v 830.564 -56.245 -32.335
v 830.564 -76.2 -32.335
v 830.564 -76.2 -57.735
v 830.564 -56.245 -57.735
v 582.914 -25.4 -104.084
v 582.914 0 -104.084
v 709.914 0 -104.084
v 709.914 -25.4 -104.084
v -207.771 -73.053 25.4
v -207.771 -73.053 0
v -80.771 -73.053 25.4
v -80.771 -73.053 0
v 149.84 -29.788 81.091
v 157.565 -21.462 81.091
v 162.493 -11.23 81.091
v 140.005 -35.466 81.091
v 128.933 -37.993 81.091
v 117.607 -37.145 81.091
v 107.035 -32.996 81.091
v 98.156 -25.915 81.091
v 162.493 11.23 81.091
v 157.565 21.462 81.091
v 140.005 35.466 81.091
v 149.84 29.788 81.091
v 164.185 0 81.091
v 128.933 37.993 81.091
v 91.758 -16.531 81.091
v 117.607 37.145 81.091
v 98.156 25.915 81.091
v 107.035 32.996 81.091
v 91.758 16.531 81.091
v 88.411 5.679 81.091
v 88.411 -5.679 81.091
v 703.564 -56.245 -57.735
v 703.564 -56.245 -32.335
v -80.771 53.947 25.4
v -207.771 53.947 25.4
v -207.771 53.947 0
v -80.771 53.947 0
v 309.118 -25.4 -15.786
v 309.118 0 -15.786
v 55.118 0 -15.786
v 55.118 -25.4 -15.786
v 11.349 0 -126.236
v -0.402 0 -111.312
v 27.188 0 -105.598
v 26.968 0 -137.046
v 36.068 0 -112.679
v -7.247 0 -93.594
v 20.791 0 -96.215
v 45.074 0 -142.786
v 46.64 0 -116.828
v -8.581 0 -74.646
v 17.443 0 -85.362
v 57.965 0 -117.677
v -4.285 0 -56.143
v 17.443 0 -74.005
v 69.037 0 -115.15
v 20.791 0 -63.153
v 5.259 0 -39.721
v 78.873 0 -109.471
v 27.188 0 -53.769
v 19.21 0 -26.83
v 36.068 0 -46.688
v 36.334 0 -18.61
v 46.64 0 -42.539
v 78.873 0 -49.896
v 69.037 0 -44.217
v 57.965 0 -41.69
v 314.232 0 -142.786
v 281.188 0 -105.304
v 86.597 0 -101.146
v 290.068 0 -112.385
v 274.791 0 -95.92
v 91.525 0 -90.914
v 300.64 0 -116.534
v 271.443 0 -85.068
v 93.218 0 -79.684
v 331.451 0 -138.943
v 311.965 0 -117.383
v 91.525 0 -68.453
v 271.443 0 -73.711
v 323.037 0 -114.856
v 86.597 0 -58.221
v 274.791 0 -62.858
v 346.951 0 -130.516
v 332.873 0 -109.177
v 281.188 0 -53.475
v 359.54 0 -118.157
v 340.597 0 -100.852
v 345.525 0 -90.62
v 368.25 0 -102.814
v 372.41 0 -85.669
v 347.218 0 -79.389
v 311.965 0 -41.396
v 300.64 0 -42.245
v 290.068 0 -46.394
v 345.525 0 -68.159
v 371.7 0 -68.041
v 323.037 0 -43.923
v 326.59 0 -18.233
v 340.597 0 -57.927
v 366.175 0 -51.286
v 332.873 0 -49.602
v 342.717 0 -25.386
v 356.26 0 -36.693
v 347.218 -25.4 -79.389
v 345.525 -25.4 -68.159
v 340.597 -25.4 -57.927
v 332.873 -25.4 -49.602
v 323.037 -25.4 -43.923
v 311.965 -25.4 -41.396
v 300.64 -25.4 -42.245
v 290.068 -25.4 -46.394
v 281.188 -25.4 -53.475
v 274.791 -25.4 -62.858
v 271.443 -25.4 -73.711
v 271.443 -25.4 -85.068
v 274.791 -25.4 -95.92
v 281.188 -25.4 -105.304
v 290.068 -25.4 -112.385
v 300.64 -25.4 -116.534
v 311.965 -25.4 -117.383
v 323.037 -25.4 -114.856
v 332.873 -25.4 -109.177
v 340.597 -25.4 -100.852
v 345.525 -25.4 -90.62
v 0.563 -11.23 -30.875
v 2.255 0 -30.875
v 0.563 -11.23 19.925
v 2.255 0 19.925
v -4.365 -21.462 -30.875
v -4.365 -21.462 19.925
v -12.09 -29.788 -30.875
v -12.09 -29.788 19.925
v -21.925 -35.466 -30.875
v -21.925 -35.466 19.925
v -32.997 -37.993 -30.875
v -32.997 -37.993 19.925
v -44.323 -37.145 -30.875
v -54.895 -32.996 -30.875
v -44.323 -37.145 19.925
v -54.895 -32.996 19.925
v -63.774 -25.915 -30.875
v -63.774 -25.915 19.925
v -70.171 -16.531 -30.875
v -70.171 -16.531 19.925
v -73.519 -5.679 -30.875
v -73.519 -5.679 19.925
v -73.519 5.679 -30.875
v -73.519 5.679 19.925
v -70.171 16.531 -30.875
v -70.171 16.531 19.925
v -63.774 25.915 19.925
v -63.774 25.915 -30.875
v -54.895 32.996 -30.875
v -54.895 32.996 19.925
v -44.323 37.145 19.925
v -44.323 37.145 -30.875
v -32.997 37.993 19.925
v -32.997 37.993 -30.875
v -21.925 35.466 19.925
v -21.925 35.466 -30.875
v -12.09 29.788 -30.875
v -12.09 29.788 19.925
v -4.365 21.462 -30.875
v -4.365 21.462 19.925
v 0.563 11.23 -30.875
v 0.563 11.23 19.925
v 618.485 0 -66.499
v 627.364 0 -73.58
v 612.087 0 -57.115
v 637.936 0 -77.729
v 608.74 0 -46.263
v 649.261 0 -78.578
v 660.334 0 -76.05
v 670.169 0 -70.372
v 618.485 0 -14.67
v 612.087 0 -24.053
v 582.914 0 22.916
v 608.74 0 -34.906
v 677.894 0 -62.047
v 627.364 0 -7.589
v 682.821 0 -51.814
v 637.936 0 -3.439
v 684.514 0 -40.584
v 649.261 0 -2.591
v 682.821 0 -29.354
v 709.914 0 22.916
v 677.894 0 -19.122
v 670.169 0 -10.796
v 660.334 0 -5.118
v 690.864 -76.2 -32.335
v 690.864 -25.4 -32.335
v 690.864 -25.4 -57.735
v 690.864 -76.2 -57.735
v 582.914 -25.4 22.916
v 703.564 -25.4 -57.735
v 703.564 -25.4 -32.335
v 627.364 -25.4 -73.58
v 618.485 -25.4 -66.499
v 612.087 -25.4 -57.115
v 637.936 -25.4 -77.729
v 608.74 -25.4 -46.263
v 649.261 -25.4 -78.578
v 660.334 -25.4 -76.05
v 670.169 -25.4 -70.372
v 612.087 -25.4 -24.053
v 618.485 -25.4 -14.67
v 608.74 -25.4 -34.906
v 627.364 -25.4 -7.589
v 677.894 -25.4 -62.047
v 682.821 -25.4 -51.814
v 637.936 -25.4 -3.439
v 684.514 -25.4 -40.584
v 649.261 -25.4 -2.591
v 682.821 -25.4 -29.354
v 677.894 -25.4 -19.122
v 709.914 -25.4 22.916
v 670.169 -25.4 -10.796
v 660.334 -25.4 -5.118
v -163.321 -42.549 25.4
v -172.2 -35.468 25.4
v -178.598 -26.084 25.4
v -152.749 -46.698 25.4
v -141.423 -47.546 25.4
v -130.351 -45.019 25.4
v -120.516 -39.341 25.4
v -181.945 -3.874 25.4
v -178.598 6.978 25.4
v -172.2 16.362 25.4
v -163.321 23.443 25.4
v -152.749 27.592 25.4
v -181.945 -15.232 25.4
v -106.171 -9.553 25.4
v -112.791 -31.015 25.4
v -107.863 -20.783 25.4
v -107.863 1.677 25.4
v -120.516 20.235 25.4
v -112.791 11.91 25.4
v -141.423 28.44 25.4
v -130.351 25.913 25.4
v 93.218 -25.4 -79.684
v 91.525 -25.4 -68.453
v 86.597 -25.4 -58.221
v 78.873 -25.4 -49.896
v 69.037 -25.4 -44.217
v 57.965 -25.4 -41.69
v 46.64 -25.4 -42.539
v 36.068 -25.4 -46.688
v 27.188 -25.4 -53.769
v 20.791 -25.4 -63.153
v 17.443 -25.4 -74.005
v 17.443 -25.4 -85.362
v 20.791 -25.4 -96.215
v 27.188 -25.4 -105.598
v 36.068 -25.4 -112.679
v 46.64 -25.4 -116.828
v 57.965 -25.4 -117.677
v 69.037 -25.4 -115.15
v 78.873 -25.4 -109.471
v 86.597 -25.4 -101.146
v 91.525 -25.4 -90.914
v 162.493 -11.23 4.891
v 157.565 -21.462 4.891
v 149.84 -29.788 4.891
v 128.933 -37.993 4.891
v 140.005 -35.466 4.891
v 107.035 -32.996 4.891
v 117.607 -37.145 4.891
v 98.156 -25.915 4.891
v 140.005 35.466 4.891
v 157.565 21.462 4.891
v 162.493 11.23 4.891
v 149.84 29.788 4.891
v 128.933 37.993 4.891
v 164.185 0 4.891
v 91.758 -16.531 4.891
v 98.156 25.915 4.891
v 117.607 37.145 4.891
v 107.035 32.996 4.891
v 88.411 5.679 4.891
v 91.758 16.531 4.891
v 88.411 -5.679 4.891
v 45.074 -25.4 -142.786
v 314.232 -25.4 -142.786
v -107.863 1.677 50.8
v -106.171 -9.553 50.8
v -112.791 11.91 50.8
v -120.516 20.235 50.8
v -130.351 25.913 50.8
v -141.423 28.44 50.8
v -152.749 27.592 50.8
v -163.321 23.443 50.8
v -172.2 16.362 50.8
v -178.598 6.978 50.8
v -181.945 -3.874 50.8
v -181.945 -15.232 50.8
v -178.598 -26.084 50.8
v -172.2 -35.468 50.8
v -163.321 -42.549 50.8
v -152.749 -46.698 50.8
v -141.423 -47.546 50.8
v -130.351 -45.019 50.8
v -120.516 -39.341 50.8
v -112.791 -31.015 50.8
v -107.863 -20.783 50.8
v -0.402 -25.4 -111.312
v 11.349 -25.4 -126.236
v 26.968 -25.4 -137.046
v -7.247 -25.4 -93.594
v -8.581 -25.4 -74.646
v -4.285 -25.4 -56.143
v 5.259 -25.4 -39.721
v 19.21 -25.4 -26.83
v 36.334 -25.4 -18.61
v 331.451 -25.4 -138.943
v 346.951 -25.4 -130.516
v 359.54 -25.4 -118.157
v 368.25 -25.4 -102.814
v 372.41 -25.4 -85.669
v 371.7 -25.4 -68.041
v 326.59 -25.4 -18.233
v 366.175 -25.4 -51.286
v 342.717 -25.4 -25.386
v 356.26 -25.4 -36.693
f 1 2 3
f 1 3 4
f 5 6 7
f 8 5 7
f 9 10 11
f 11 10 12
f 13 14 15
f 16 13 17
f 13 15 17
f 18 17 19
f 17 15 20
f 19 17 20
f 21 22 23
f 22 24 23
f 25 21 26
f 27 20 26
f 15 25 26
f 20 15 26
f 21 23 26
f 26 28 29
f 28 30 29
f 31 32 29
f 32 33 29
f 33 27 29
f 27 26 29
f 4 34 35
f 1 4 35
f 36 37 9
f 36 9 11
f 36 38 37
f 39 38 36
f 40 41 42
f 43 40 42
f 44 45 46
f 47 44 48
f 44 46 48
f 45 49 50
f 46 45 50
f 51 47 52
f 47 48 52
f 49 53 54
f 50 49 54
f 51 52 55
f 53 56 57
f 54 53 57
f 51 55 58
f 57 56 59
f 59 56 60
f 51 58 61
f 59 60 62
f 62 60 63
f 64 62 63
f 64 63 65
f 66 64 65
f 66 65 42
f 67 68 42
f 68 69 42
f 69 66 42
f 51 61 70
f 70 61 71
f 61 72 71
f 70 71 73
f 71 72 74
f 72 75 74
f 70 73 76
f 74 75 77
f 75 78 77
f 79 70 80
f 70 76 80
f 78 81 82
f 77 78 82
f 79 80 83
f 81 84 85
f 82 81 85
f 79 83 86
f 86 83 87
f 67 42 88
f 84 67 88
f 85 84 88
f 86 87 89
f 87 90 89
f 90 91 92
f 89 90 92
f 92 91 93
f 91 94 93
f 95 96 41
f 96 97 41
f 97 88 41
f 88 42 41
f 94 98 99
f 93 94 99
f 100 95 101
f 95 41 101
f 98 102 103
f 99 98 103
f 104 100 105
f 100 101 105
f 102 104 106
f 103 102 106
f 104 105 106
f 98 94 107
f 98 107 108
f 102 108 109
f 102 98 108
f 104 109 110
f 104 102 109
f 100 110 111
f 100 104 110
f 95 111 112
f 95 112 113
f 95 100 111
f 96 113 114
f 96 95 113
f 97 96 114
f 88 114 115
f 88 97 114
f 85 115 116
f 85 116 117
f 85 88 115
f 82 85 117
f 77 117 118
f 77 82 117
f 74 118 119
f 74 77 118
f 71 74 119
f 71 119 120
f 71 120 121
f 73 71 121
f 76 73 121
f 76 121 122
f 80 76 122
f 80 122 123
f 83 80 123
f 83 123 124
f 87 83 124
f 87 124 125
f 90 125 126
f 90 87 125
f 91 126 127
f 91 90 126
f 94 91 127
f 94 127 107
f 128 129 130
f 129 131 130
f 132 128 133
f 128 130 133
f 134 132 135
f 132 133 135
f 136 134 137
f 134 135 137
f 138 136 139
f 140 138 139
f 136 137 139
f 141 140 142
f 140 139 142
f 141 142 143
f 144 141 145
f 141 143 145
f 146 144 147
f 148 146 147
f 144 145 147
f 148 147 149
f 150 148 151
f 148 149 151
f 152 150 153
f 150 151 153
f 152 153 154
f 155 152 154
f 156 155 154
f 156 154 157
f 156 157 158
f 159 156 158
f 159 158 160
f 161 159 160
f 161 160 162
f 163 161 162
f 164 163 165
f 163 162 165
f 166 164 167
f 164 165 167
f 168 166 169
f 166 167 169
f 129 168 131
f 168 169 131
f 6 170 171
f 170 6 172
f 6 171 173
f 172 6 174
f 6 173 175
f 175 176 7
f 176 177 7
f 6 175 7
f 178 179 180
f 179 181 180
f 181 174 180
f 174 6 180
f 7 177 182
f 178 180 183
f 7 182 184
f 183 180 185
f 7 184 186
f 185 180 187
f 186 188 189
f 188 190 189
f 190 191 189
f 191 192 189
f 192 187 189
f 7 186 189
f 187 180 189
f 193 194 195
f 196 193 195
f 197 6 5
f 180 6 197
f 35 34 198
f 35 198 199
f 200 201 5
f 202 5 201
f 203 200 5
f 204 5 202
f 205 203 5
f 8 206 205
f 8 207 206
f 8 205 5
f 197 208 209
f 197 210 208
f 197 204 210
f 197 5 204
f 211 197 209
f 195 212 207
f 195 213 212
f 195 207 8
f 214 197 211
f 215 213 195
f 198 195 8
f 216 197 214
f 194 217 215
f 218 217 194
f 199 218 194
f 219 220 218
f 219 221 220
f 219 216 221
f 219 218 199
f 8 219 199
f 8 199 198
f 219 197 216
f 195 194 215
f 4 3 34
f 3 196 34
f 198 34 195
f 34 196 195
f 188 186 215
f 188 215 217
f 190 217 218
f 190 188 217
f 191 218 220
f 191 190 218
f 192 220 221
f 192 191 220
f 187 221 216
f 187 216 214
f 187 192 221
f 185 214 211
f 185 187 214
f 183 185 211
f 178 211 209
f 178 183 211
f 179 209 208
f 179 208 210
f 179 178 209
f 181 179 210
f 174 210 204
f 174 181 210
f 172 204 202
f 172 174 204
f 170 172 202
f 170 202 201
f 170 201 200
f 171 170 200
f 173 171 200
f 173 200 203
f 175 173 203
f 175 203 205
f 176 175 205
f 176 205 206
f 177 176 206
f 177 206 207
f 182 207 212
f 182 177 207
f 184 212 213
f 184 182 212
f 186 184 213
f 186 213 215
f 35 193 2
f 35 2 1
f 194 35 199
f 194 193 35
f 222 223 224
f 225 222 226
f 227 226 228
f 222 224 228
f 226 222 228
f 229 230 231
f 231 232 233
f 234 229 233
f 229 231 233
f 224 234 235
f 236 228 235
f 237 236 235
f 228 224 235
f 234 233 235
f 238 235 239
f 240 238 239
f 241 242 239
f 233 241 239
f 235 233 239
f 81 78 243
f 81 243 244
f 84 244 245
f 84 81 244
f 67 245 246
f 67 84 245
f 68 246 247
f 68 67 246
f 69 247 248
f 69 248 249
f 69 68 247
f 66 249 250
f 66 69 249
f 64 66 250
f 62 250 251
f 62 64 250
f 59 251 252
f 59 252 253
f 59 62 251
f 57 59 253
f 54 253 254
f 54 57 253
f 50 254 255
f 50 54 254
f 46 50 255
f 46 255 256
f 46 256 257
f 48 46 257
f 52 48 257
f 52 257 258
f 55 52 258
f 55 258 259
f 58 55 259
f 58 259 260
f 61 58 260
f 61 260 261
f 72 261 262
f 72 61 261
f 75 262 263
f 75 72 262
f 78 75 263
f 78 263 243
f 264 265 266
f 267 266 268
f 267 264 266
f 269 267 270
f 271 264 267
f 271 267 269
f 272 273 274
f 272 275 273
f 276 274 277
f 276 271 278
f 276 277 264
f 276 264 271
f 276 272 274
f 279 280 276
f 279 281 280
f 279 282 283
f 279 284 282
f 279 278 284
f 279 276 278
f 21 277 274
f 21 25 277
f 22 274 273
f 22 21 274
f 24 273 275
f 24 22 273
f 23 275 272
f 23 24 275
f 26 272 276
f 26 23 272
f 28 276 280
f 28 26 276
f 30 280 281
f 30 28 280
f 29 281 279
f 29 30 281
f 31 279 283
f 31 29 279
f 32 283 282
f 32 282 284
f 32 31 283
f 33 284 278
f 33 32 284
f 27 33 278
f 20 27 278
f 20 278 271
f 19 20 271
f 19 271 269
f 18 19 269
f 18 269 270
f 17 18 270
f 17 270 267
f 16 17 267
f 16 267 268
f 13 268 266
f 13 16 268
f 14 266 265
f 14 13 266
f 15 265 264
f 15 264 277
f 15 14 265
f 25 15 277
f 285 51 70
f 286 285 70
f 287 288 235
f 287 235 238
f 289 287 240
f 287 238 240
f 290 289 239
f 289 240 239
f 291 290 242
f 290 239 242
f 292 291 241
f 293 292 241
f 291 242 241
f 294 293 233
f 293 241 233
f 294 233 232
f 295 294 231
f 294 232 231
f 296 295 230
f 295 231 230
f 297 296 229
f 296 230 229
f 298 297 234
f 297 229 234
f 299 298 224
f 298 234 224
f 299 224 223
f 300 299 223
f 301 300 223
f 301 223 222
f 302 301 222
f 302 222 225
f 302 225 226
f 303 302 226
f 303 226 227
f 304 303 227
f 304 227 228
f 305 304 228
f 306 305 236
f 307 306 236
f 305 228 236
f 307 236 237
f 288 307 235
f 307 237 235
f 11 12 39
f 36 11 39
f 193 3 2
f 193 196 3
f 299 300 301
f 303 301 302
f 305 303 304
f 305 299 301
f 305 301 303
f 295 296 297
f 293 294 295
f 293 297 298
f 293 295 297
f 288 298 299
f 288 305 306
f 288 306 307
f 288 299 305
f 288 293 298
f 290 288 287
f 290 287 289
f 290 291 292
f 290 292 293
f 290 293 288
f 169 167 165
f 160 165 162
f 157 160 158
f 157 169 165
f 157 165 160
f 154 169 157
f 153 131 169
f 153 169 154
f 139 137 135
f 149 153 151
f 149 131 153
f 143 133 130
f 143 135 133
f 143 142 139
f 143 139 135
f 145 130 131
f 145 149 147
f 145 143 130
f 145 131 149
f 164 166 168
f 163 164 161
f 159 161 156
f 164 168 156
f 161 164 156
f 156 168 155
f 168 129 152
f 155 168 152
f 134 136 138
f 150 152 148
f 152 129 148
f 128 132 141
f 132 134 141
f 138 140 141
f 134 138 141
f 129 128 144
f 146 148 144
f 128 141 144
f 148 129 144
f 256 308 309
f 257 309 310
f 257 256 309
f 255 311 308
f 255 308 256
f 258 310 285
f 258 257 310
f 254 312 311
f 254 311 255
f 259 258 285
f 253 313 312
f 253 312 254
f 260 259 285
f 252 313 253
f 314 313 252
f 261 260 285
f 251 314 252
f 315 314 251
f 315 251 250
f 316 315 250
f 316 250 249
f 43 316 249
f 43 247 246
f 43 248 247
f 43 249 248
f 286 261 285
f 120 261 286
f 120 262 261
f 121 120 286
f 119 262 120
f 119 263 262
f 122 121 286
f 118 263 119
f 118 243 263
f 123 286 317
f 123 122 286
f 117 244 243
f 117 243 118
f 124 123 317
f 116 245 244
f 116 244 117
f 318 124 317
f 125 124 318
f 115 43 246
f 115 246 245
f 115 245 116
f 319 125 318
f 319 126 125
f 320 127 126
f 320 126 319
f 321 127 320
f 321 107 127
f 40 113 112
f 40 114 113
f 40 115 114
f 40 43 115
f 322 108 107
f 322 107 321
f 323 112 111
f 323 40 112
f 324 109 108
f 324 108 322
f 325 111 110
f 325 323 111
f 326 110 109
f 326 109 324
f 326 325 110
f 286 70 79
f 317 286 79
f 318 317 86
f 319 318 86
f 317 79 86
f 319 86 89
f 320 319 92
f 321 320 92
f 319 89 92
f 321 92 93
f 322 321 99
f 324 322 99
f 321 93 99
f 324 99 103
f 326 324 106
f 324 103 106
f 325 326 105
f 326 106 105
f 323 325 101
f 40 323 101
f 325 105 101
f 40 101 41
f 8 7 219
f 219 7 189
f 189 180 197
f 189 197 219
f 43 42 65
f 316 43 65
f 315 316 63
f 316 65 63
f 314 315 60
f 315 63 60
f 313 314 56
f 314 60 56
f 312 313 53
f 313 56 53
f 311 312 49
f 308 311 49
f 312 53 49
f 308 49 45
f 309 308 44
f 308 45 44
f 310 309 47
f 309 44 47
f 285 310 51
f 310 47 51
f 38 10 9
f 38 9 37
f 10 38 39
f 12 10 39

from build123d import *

# Parameters (mm, degrees)
F0_W      = 127
F0_H      = 127
F1_DEPTH  = 25.4
F2_R      = 38.1
F3_DEPTH  = 25.4
F4_R      = 38.1
F5_DEPTH  = 25.4
F6_W      = 38.1
F6_H      = 50.8
F8_W      = 38.1
F8_H      = 76.2
F10_W     = 127
F10_H     = 127
F10_R     = 38.1
F11_DEPTH = 25.4
F13_DEPTH = 50.8
F14_W     = 19.954788
F14_H     = 25.4
F15_DEPTH = 127


with BuildPart() as f1:
    # F0 (on Top) → F1 (new body)
    with BuildSketch(Plane.XY):
        with Locations((-144.270627, -9.552994)):
            Rectangle(F0_W, F0_H)
    extrude(amount=F1_DEPTH)


with BuildPart() as f3:
    # F2 (on face) → F3 (new body)
    with BuildSketch(Plane.XY.offset(25.4)):
        with Locations((-144.270627, -9.552994)):
            Circle(F2_R)
    extrude(amount=F3_DEPTH)


with BuildPart() as f5:
    # F4 (on Front) → F5 (new body)
    with BuildSketch(Plane.XZ):
        with BuildLine():
            Line((309.117671, -15.78643), (55.117671, -15.78643))
            ThreePointArc((55.117671, -15.78643), (-8.58059, -74.646086), (45.074058, -142.78643))
            Line((45.074058, -142.78643), (314.232207, -142.78643))
            ThreePointArc((314.232207, -142.78643), (372.669144, -76.830075), (309.117671, -15.78643))
        make_face()
        with Locations((55.117671, -79.683572)):
            Circle(F4_R, mode=Mode.SUBTRACT)
        with Locations((309.117671, -79.389416)):
            Circle(F4_R, mode=Mode.SUBTRACT)
    extrude(amount=F5_DEPTH)


with BuildPart() as f7:
    # F6 (on Front) → F7 (revolve)
    with BuildSketch(Plane.XZ):
        with Locations((-16.794519, -5.474863)):
            Rectangle(F6_W, F6_H)
    revolve(axis=Axis((-35.844519, 0, -9.16196), (0, 0, -1)))


with BuildPart() as f9:
    # F8 (on Front) → F9 (revolve)
    with BuildSketch(Plane.XZ):
        with Locations((145.135407, 42.991044)):
            Rectangle(F8_W, F8_H)
    revolve(axis=Axis((126.085407, 0, 94.616761), (0, 0, 1)))


with BuildPart() as f11:
    # F10 (on Front) → F11 (new body)
    with BuildSketch(Plane.XZ):
        with Locations((646.414073, -40.584184)):
            Rectangle(F10_W, F10_H)
        with Locations((646.414073, -40.584184)):
            Circle(F10_R, mode=Mode.SUBTRACT)
    extrude(amount=F11_DEPTH)

    # F12 (on face) → F13 (join)
    with BuildSketch(Plane.XZ.offset(25.4)):
        Polygon((703.564073, -57.734713), (703.564073, -40.584184), (692.02312, -40.584184), (690.864073, -40.584184), (690.864073, -57.734713), align=None)
        Polygon((692.02312, -40.584184), (703.564073, -40.584184), (703.564073, -32.334713), (690.864073, -32.334713), (690.864073, -40.584184), align=None)
    extrude(amount=F13_DEPTH)

    # F14 (on face) → F15 (join)
    with BuildSketch(Plane.YZ.offset(703.564073)):
        with Locations((-66.222606, -45.034713)):
            Rectangle(F14_W, F14_H)
    extrude(amount=F15_DEPTH)


solid = Compound([f1.part, f3.part, f5.part, f7.part, f9.part, f11.part])
